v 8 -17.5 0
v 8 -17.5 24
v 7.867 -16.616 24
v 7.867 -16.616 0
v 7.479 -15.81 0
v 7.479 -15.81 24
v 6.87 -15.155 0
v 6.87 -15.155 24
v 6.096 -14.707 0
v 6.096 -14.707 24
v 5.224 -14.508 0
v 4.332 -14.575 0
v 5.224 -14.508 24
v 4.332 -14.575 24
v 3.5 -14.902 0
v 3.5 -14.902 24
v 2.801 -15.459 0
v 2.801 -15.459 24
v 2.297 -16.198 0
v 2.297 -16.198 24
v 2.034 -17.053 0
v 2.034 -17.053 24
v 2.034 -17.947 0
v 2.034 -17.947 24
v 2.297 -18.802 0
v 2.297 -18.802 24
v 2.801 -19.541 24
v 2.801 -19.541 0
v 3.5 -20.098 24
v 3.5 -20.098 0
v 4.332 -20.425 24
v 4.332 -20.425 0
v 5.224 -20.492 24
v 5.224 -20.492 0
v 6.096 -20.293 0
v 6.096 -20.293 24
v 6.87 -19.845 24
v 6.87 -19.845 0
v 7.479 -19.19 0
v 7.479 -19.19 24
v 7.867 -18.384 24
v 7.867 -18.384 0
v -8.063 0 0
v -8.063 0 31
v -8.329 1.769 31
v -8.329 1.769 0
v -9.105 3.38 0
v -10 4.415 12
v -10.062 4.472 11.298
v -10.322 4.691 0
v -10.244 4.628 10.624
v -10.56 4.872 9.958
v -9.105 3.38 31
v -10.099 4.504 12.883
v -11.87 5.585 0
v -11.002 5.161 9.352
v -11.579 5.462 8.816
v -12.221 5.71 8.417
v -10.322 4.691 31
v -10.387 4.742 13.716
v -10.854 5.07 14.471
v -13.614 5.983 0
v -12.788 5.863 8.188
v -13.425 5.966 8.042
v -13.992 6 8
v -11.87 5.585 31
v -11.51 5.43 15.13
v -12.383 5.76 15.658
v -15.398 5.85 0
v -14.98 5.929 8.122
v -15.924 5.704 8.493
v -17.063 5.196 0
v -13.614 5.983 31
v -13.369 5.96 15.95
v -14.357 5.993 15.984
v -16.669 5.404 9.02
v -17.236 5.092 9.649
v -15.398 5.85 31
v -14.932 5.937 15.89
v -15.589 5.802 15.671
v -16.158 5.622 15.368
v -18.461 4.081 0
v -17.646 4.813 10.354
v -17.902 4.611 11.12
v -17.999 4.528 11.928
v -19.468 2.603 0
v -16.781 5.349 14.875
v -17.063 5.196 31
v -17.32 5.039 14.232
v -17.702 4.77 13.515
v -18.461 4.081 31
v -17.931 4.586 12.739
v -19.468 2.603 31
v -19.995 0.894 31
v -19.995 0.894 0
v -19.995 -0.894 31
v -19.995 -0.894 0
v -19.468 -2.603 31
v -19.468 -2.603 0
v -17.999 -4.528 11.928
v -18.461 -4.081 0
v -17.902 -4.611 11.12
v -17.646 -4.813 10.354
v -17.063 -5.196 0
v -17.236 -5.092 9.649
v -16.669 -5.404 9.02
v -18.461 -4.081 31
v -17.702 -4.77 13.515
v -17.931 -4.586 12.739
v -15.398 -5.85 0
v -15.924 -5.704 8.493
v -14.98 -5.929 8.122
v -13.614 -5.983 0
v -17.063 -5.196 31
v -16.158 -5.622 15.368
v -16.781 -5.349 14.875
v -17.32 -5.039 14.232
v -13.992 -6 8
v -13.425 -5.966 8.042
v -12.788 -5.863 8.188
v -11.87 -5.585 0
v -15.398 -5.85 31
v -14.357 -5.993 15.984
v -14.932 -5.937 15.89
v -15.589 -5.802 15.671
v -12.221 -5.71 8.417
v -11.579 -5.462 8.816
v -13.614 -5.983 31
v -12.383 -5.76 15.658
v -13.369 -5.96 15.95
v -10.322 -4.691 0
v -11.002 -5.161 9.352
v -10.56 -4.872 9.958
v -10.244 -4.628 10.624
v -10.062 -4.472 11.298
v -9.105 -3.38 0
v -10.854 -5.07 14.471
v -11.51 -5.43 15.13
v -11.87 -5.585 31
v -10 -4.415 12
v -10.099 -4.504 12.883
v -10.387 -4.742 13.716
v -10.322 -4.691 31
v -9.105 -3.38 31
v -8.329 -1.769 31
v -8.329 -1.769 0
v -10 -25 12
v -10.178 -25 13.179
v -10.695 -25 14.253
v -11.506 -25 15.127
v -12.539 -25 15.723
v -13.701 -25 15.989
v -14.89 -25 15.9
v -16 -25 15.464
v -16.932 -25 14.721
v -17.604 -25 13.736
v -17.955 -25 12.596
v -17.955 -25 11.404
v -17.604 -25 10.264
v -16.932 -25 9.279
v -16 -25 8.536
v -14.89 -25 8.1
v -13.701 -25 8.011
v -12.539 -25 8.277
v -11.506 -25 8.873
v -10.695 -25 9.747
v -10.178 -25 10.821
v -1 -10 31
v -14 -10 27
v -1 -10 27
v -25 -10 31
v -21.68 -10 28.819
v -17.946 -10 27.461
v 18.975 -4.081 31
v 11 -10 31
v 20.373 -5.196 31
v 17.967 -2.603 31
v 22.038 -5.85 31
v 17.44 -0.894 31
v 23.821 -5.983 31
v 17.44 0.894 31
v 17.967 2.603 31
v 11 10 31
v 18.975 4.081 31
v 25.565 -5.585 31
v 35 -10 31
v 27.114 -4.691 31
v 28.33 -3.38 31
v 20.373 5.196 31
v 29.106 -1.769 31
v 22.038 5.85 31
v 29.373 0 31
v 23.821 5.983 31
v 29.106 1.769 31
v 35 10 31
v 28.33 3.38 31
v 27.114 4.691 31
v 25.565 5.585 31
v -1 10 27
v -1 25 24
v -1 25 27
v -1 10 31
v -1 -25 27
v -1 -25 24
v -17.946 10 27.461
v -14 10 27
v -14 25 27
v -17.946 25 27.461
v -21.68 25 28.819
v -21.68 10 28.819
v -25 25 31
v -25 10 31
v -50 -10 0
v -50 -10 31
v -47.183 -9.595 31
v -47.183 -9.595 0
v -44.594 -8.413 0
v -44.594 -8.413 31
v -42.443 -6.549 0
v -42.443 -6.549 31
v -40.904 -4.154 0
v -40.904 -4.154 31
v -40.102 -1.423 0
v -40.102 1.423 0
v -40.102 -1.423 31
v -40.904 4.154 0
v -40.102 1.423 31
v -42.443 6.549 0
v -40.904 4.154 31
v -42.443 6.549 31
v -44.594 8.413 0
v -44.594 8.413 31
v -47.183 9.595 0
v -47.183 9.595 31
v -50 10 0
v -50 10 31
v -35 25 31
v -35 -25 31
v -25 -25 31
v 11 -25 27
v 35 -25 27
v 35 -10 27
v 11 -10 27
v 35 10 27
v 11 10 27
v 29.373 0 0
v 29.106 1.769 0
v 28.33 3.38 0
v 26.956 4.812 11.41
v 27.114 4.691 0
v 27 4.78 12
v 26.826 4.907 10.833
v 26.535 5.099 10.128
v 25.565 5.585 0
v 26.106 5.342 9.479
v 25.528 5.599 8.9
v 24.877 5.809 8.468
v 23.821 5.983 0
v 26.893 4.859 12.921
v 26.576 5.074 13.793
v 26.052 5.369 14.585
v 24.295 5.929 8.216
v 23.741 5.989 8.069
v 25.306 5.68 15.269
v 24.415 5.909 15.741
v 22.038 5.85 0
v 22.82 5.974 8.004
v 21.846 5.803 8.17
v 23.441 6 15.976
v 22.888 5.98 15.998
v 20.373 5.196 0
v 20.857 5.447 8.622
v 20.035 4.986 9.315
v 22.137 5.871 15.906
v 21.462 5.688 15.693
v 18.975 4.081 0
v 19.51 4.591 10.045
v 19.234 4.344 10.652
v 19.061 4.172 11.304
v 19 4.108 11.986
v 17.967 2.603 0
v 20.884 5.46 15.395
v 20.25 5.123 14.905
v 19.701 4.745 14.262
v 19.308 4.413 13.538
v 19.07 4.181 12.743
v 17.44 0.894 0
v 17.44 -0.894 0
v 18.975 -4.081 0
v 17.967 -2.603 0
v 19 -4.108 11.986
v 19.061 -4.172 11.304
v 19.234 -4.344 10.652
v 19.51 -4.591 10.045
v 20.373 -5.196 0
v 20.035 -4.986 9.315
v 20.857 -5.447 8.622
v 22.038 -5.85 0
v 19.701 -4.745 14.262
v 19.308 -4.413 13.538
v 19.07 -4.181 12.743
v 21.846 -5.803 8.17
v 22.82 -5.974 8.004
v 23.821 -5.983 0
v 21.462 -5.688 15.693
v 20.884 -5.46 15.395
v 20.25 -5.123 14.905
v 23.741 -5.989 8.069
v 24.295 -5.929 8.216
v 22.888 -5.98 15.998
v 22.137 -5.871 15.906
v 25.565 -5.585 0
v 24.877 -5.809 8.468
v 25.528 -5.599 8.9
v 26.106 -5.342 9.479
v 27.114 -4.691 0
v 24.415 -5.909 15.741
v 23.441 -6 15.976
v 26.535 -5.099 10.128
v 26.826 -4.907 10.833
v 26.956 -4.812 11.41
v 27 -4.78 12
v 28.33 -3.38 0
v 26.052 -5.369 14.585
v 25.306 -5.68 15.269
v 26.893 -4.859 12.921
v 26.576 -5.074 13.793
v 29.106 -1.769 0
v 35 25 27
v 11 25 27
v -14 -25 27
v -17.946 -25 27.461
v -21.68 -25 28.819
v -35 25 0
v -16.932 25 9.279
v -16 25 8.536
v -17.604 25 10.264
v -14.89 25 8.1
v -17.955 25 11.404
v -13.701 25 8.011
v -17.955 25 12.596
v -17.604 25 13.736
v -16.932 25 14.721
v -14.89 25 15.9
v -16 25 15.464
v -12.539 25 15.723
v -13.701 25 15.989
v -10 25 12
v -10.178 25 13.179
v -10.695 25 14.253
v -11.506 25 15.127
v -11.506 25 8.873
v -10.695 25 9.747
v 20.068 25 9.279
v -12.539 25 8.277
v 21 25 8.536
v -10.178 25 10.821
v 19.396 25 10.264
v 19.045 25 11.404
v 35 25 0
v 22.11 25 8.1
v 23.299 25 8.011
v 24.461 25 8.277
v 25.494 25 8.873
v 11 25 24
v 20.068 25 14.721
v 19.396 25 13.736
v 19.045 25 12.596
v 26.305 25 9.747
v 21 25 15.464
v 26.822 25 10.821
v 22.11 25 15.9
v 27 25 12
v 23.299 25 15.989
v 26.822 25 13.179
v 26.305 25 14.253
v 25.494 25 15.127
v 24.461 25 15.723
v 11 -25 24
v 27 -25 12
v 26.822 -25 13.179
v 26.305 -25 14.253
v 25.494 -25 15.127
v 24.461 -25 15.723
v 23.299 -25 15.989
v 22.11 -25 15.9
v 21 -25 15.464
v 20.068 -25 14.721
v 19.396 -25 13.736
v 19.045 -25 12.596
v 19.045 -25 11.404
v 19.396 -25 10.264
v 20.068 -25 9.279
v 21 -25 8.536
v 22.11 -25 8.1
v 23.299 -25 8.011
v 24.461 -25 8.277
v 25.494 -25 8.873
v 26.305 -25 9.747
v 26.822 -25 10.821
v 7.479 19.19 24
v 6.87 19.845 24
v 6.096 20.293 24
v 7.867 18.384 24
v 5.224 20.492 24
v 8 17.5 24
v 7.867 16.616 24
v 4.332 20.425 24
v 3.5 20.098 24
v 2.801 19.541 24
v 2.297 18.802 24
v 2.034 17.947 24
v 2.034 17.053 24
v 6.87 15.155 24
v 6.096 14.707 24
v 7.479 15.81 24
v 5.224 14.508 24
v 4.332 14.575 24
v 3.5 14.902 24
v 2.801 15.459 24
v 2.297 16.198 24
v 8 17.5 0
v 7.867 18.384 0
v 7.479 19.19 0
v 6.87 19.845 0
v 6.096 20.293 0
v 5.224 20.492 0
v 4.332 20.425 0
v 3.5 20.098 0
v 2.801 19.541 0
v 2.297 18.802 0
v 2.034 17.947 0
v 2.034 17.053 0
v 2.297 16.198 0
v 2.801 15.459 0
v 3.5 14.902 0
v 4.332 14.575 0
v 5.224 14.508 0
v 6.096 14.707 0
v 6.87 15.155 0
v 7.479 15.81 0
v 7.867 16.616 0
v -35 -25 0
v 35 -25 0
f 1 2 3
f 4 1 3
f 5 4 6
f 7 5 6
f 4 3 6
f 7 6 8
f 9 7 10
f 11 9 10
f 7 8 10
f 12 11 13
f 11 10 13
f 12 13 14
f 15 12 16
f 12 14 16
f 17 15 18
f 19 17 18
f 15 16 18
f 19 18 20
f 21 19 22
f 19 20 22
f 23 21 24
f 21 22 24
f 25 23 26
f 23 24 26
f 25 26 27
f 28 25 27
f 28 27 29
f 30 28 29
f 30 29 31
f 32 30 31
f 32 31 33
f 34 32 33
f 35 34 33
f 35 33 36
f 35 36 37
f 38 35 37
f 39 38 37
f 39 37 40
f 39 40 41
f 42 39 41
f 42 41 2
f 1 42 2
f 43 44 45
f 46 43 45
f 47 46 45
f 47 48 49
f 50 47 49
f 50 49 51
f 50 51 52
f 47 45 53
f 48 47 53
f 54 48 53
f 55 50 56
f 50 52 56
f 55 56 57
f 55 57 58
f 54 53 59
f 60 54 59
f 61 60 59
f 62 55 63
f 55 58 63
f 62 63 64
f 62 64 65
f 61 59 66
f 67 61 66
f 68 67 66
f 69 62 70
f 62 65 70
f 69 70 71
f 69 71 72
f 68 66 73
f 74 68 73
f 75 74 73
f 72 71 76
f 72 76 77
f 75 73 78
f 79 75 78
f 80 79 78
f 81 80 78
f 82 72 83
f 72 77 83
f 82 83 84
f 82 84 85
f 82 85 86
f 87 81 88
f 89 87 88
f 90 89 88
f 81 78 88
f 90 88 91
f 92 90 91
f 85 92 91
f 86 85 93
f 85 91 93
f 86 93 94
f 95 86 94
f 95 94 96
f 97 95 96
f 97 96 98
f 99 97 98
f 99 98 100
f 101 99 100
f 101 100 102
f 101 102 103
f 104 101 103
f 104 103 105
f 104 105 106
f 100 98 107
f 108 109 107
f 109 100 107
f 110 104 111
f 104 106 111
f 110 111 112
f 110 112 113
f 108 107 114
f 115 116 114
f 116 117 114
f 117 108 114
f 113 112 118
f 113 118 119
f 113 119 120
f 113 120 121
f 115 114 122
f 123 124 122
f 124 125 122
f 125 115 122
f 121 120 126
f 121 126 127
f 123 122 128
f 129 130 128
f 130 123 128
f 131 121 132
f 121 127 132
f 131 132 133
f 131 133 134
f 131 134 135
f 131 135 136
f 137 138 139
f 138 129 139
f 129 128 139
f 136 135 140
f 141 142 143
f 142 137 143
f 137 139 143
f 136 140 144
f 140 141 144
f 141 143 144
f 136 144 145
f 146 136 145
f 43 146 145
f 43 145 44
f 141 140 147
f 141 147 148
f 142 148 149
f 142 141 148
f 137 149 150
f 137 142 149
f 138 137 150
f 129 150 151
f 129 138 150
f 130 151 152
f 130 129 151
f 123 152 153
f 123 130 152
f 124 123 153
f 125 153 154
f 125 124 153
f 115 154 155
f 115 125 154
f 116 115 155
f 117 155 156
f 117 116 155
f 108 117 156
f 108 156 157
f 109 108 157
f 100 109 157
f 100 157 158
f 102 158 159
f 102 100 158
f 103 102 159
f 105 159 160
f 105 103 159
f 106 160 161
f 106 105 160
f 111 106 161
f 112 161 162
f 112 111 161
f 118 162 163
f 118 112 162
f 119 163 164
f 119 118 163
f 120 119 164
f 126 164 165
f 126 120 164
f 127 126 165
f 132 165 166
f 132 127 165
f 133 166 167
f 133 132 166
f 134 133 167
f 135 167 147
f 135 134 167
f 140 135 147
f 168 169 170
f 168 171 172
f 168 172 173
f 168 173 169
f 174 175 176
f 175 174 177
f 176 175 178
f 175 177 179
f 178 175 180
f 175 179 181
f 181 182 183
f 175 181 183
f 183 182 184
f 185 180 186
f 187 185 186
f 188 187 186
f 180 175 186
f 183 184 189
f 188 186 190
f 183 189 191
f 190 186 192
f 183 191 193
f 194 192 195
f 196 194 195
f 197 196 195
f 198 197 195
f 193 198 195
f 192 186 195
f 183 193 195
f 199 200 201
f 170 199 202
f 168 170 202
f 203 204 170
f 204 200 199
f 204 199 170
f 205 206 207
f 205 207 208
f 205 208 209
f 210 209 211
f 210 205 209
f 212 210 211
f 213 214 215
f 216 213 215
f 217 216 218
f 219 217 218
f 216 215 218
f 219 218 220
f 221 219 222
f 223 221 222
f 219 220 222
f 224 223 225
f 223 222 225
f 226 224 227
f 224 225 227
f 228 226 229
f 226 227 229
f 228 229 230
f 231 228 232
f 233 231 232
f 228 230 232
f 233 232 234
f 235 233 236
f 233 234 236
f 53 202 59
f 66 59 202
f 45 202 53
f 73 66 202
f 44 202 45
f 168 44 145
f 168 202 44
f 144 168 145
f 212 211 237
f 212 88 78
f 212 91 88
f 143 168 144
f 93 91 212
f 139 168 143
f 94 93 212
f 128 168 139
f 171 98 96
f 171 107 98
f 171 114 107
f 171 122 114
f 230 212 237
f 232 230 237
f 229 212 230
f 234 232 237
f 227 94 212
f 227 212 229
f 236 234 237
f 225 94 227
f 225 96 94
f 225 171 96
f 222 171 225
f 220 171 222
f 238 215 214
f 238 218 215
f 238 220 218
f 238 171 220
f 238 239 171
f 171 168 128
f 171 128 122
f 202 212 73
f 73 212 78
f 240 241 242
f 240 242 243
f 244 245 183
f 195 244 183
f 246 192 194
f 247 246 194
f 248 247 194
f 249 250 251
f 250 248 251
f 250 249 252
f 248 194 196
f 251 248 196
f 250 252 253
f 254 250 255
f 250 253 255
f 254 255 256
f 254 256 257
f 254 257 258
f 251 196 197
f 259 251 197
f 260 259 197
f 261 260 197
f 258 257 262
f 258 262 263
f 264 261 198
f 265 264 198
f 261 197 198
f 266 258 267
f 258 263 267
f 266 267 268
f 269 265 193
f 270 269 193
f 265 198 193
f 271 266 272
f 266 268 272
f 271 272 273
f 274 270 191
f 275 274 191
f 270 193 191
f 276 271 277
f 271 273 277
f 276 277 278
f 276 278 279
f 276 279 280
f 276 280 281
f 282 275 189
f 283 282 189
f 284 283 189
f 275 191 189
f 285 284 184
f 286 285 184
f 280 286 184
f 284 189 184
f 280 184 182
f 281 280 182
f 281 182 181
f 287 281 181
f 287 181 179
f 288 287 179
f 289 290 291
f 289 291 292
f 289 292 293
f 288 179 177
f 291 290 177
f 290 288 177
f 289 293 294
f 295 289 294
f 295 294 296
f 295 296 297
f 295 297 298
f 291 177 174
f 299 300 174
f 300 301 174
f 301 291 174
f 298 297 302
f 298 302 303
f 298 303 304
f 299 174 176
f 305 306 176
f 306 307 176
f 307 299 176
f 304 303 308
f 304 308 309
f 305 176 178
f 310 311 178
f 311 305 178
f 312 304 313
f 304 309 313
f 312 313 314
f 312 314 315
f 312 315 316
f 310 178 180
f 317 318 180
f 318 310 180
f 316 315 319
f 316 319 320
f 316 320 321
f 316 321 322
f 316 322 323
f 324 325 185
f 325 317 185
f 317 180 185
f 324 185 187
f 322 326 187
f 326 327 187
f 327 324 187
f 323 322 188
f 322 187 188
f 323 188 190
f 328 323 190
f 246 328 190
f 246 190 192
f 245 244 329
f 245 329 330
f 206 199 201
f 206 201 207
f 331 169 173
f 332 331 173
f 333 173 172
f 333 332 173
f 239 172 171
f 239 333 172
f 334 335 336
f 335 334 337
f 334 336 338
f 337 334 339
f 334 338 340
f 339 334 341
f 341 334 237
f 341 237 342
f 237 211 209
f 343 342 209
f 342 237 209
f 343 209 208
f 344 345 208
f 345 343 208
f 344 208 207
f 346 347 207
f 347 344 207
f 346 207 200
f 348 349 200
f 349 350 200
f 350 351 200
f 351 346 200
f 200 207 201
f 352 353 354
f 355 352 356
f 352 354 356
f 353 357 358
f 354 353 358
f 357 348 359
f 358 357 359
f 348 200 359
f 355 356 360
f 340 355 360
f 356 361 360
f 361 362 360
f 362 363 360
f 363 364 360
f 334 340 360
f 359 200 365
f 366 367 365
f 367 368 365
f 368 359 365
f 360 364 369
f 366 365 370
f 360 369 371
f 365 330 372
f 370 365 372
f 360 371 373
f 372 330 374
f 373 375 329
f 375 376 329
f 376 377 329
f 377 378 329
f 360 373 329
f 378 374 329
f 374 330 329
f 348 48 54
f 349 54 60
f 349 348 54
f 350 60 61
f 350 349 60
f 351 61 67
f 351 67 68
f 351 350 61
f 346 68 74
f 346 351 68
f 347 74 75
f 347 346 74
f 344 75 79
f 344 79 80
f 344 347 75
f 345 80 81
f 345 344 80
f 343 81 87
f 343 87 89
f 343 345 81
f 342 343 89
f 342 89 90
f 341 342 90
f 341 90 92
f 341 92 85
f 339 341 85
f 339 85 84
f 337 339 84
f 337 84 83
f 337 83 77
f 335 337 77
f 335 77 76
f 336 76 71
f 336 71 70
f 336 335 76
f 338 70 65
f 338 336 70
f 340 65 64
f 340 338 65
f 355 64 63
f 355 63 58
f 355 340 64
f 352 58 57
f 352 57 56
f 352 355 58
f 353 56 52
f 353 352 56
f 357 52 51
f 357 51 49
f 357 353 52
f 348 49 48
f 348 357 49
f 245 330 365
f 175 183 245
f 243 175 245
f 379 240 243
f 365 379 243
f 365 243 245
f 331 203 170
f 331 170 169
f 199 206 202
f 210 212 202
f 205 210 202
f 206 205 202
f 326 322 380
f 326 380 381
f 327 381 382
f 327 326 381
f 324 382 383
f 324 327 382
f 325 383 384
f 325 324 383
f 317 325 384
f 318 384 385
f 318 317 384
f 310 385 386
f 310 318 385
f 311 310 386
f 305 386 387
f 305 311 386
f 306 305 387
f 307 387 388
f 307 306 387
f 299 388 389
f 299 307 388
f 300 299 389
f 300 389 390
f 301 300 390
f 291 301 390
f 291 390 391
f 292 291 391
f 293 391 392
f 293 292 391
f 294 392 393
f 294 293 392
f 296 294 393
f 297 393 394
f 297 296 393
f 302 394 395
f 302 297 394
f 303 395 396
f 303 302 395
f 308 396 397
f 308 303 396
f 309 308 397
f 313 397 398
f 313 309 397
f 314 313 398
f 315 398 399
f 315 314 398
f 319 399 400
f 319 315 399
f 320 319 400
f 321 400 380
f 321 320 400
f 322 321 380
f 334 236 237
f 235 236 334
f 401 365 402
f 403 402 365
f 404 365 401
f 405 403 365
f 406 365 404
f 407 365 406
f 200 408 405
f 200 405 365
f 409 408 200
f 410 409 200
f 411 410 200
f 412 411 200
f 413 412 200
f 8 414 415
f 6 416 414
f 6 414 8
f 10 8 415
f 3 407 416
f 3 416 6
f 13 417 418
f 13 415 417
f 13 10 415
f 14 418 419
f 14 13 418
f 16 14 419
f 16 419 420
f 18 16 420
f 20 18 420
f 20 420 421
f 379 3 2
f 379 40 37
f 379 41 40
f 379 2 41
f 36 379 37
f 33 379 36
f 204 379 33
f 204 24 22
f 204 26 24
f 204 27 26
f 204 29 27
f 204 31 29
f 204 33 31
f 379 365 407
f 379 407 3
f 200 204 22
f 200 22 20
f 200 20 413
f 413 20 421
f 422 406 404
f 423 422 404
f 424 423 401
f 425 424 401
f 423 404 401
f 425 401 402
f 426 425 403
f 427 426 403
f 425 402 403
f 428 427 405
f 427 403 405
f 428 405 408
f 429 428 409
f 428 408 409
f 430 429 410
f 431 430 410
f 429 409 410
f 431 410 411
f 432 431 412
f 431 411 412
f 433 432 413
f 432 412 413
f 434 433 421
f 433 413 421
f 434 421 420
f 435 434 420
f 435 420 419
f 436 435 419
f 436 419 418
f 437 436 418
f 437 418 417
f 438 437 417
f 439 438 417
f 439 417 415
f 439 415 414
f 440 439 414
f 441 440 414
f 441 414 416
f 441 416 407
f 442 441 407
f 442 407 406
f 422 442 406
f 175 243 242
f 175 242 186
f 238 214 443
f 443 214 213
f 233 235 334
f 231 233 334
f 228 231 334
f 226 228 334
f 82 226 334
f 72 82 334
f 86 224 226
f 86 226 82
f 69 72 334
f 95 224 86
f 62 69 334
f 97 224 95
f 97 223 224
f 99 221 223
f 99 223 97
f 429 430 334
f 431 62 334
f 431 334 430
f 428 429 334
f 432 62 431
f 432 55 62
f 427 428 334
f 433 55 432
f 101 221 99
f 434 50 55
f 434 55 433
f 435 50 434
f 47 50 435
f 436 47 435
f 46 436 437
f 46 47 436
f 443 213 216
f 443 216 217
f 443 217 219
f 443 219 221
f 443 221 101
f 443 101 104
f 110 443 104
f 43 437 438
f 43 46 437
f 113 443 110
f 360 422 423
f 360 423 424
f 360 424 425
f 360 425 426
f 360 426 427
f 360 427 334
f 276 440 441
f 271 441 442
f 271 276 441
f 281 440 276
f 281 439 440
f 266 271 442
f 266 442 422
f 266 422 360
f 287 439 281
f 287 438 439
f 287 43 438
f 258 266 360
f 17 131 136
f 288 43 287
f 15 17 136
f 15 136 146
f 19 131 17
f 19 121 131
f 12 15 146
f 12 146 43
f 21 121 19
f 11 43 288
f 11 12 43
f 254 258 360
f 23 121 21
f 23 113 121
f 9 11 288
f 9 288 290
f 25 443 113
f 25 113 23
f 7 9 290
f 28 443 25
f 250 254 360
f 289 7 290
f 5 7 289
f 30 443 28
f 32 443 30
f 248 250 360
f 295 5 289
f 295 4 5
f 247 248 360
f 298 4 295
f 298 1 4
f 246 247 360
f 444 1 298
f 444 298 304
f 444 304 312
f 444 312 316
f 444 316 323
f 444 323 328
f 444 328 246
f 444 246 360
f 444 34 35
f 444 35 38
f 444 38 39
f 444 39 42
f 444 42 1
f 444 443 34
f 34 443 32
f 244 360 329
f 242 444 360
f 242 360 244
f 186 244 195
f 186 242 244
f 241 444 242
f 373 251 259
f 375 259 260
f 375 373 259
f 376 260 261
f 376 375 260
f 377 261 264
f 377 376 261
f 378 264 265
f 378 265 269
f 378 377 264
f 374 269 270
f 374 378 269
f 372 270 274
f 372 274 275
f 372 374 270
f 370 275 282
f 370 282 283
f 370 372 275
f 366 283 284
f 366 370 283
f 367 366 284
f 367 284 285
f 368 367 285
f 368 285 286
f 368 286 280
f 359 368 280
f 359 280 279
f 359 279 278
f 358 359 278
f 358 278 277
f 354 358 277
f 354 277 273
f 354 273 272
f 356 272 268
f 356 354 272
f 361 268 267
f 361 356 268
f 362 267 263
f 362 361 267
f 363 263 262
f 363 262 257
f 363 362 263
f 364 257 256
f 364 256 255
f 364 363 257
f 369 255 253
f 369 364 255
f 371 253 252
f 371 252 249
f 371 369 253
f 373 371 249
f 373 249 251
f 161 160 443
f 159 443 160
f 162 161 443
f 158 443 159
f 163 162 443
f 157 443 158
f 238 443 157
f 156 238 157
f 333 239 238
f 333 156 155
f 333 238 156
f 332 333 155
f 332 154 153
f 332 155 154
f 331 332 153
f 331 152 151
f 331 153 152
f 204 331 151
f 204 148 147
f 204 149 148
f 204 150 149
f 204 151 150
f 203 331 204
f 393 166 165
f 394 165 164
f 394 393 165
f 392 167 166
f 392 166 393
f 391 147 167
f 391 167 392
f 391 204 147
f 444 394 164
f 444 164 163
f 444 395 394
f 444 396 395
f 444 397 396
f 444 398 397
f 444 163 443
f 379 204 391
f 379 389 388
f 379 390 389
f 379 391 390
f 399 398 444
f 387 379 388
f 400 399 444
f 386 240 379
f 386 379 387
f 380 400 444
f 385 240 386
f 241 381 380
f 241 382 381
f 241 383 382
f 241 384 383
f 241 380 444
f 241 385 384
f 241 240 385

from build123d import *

# Parameters (mm, degrees)
F0_R      = 4
F1_DEPTH  = 25
F2_DEPTH  = 10
F3_SIZE   = 15
F4_R      = 10
F5_DEPTH  = 31
F6_W      = 20
F6_H      = 4
F7_DEPTH  = 24
F8_R      = 6
F9_DEPTH  = 31
F10_R     = 3
F11_DEPTH = 27


with BuildPart() as f1:
    # F0 (on Front) → F1 (new body, symmetric)
    with BuildSketch(Plane.XZ):
        with BuildLine():
            Line((-50, 0), (35, 0))
            Line((35, 0), (35, 27))
            Line((35, 27), (11, 27))
            Line((11, 27), (11, 24))
            Line((11, 24), (-1, 24))
            Line((-1, 24), (-1, 27))
            Line((-1, 27), (-14, 27))
            ThreePointArc((-14, 27), (-19.85235, 28.031038), (-25, 31))
            Line((-25, 31), (-50, 31))
            Line((-50, 31), (-50, 0))
        make_face()
        with Locations((-14, 12)):
            Circle(F0_R, mode=Mode.SUBTRACT)
        with Locations((23, 12)):
            Circle(F0_R, mode=Mode.SUBTRACT)
    extrude(amount=F1_DEPTH, both=True)

    # F0 (on Front) → F2 (join, symmetric)
    with BuildSketch(Plane.XZ):
        with BuildLine():
            Line((-1, 31), (-25, 31))
            ThreePointArc((-25, 31), (-19.85235, 28.031038), (-14, 27))
            Line((-14, 27), (-1, 27))
            Line((-1, 27), (-1, 31))
        make_face()
    extrude(amount=F2_DEPTH, both=True)

    # F3
    f3_edges = [f1.edges().sort_by_distance(p)[0] for p in [
        (-50, -25, 15.5),
        (-50, 25, 15.5),
    ]]
    chamfer(f3_edges, length=F3_SIZE)

    # F4 (on face) → F5 (cut)
    with BuildSketch(Plane.XY.offset(31)):
        with Locations((-50, 0)):
            Circle(F4_R)
    extrude(amount=-F5_DEPTH, mode=Mode.SUBTRACT)

    # F6 (on face) → F7 (join)
    with BuildSketch(Plane.YZ.offset(35)):
        with Locations((0, 29)):
            Rectangle(F6_W, F6_H)
    extrude(amount=-F7_DEPTH)

    # F8 (on face) → F9 (cut)
    with BuildSketch(Plane.XY.offset(31)):
        with Locations((-14.062501, 0)):
            Circle(F8_R)
        with Locations((23.372846, 0)):
            Circle(F8_R)
    extrude(amount=-F9_DEPTH, mode=Mode.SUBTRACT)

    # F10 (on face) → F11 (cut)
    with BuildSketch(Plane.XY.offset(24)):
        with Locations((5, 17.5)):
            Circle(F10_R)
        with Locations((5, -17.5)):
            Circle(F10_R)
    extrude(amount=-F11_DEPTH, mode=Mode.SUBTRACT)


solid = f1.part
